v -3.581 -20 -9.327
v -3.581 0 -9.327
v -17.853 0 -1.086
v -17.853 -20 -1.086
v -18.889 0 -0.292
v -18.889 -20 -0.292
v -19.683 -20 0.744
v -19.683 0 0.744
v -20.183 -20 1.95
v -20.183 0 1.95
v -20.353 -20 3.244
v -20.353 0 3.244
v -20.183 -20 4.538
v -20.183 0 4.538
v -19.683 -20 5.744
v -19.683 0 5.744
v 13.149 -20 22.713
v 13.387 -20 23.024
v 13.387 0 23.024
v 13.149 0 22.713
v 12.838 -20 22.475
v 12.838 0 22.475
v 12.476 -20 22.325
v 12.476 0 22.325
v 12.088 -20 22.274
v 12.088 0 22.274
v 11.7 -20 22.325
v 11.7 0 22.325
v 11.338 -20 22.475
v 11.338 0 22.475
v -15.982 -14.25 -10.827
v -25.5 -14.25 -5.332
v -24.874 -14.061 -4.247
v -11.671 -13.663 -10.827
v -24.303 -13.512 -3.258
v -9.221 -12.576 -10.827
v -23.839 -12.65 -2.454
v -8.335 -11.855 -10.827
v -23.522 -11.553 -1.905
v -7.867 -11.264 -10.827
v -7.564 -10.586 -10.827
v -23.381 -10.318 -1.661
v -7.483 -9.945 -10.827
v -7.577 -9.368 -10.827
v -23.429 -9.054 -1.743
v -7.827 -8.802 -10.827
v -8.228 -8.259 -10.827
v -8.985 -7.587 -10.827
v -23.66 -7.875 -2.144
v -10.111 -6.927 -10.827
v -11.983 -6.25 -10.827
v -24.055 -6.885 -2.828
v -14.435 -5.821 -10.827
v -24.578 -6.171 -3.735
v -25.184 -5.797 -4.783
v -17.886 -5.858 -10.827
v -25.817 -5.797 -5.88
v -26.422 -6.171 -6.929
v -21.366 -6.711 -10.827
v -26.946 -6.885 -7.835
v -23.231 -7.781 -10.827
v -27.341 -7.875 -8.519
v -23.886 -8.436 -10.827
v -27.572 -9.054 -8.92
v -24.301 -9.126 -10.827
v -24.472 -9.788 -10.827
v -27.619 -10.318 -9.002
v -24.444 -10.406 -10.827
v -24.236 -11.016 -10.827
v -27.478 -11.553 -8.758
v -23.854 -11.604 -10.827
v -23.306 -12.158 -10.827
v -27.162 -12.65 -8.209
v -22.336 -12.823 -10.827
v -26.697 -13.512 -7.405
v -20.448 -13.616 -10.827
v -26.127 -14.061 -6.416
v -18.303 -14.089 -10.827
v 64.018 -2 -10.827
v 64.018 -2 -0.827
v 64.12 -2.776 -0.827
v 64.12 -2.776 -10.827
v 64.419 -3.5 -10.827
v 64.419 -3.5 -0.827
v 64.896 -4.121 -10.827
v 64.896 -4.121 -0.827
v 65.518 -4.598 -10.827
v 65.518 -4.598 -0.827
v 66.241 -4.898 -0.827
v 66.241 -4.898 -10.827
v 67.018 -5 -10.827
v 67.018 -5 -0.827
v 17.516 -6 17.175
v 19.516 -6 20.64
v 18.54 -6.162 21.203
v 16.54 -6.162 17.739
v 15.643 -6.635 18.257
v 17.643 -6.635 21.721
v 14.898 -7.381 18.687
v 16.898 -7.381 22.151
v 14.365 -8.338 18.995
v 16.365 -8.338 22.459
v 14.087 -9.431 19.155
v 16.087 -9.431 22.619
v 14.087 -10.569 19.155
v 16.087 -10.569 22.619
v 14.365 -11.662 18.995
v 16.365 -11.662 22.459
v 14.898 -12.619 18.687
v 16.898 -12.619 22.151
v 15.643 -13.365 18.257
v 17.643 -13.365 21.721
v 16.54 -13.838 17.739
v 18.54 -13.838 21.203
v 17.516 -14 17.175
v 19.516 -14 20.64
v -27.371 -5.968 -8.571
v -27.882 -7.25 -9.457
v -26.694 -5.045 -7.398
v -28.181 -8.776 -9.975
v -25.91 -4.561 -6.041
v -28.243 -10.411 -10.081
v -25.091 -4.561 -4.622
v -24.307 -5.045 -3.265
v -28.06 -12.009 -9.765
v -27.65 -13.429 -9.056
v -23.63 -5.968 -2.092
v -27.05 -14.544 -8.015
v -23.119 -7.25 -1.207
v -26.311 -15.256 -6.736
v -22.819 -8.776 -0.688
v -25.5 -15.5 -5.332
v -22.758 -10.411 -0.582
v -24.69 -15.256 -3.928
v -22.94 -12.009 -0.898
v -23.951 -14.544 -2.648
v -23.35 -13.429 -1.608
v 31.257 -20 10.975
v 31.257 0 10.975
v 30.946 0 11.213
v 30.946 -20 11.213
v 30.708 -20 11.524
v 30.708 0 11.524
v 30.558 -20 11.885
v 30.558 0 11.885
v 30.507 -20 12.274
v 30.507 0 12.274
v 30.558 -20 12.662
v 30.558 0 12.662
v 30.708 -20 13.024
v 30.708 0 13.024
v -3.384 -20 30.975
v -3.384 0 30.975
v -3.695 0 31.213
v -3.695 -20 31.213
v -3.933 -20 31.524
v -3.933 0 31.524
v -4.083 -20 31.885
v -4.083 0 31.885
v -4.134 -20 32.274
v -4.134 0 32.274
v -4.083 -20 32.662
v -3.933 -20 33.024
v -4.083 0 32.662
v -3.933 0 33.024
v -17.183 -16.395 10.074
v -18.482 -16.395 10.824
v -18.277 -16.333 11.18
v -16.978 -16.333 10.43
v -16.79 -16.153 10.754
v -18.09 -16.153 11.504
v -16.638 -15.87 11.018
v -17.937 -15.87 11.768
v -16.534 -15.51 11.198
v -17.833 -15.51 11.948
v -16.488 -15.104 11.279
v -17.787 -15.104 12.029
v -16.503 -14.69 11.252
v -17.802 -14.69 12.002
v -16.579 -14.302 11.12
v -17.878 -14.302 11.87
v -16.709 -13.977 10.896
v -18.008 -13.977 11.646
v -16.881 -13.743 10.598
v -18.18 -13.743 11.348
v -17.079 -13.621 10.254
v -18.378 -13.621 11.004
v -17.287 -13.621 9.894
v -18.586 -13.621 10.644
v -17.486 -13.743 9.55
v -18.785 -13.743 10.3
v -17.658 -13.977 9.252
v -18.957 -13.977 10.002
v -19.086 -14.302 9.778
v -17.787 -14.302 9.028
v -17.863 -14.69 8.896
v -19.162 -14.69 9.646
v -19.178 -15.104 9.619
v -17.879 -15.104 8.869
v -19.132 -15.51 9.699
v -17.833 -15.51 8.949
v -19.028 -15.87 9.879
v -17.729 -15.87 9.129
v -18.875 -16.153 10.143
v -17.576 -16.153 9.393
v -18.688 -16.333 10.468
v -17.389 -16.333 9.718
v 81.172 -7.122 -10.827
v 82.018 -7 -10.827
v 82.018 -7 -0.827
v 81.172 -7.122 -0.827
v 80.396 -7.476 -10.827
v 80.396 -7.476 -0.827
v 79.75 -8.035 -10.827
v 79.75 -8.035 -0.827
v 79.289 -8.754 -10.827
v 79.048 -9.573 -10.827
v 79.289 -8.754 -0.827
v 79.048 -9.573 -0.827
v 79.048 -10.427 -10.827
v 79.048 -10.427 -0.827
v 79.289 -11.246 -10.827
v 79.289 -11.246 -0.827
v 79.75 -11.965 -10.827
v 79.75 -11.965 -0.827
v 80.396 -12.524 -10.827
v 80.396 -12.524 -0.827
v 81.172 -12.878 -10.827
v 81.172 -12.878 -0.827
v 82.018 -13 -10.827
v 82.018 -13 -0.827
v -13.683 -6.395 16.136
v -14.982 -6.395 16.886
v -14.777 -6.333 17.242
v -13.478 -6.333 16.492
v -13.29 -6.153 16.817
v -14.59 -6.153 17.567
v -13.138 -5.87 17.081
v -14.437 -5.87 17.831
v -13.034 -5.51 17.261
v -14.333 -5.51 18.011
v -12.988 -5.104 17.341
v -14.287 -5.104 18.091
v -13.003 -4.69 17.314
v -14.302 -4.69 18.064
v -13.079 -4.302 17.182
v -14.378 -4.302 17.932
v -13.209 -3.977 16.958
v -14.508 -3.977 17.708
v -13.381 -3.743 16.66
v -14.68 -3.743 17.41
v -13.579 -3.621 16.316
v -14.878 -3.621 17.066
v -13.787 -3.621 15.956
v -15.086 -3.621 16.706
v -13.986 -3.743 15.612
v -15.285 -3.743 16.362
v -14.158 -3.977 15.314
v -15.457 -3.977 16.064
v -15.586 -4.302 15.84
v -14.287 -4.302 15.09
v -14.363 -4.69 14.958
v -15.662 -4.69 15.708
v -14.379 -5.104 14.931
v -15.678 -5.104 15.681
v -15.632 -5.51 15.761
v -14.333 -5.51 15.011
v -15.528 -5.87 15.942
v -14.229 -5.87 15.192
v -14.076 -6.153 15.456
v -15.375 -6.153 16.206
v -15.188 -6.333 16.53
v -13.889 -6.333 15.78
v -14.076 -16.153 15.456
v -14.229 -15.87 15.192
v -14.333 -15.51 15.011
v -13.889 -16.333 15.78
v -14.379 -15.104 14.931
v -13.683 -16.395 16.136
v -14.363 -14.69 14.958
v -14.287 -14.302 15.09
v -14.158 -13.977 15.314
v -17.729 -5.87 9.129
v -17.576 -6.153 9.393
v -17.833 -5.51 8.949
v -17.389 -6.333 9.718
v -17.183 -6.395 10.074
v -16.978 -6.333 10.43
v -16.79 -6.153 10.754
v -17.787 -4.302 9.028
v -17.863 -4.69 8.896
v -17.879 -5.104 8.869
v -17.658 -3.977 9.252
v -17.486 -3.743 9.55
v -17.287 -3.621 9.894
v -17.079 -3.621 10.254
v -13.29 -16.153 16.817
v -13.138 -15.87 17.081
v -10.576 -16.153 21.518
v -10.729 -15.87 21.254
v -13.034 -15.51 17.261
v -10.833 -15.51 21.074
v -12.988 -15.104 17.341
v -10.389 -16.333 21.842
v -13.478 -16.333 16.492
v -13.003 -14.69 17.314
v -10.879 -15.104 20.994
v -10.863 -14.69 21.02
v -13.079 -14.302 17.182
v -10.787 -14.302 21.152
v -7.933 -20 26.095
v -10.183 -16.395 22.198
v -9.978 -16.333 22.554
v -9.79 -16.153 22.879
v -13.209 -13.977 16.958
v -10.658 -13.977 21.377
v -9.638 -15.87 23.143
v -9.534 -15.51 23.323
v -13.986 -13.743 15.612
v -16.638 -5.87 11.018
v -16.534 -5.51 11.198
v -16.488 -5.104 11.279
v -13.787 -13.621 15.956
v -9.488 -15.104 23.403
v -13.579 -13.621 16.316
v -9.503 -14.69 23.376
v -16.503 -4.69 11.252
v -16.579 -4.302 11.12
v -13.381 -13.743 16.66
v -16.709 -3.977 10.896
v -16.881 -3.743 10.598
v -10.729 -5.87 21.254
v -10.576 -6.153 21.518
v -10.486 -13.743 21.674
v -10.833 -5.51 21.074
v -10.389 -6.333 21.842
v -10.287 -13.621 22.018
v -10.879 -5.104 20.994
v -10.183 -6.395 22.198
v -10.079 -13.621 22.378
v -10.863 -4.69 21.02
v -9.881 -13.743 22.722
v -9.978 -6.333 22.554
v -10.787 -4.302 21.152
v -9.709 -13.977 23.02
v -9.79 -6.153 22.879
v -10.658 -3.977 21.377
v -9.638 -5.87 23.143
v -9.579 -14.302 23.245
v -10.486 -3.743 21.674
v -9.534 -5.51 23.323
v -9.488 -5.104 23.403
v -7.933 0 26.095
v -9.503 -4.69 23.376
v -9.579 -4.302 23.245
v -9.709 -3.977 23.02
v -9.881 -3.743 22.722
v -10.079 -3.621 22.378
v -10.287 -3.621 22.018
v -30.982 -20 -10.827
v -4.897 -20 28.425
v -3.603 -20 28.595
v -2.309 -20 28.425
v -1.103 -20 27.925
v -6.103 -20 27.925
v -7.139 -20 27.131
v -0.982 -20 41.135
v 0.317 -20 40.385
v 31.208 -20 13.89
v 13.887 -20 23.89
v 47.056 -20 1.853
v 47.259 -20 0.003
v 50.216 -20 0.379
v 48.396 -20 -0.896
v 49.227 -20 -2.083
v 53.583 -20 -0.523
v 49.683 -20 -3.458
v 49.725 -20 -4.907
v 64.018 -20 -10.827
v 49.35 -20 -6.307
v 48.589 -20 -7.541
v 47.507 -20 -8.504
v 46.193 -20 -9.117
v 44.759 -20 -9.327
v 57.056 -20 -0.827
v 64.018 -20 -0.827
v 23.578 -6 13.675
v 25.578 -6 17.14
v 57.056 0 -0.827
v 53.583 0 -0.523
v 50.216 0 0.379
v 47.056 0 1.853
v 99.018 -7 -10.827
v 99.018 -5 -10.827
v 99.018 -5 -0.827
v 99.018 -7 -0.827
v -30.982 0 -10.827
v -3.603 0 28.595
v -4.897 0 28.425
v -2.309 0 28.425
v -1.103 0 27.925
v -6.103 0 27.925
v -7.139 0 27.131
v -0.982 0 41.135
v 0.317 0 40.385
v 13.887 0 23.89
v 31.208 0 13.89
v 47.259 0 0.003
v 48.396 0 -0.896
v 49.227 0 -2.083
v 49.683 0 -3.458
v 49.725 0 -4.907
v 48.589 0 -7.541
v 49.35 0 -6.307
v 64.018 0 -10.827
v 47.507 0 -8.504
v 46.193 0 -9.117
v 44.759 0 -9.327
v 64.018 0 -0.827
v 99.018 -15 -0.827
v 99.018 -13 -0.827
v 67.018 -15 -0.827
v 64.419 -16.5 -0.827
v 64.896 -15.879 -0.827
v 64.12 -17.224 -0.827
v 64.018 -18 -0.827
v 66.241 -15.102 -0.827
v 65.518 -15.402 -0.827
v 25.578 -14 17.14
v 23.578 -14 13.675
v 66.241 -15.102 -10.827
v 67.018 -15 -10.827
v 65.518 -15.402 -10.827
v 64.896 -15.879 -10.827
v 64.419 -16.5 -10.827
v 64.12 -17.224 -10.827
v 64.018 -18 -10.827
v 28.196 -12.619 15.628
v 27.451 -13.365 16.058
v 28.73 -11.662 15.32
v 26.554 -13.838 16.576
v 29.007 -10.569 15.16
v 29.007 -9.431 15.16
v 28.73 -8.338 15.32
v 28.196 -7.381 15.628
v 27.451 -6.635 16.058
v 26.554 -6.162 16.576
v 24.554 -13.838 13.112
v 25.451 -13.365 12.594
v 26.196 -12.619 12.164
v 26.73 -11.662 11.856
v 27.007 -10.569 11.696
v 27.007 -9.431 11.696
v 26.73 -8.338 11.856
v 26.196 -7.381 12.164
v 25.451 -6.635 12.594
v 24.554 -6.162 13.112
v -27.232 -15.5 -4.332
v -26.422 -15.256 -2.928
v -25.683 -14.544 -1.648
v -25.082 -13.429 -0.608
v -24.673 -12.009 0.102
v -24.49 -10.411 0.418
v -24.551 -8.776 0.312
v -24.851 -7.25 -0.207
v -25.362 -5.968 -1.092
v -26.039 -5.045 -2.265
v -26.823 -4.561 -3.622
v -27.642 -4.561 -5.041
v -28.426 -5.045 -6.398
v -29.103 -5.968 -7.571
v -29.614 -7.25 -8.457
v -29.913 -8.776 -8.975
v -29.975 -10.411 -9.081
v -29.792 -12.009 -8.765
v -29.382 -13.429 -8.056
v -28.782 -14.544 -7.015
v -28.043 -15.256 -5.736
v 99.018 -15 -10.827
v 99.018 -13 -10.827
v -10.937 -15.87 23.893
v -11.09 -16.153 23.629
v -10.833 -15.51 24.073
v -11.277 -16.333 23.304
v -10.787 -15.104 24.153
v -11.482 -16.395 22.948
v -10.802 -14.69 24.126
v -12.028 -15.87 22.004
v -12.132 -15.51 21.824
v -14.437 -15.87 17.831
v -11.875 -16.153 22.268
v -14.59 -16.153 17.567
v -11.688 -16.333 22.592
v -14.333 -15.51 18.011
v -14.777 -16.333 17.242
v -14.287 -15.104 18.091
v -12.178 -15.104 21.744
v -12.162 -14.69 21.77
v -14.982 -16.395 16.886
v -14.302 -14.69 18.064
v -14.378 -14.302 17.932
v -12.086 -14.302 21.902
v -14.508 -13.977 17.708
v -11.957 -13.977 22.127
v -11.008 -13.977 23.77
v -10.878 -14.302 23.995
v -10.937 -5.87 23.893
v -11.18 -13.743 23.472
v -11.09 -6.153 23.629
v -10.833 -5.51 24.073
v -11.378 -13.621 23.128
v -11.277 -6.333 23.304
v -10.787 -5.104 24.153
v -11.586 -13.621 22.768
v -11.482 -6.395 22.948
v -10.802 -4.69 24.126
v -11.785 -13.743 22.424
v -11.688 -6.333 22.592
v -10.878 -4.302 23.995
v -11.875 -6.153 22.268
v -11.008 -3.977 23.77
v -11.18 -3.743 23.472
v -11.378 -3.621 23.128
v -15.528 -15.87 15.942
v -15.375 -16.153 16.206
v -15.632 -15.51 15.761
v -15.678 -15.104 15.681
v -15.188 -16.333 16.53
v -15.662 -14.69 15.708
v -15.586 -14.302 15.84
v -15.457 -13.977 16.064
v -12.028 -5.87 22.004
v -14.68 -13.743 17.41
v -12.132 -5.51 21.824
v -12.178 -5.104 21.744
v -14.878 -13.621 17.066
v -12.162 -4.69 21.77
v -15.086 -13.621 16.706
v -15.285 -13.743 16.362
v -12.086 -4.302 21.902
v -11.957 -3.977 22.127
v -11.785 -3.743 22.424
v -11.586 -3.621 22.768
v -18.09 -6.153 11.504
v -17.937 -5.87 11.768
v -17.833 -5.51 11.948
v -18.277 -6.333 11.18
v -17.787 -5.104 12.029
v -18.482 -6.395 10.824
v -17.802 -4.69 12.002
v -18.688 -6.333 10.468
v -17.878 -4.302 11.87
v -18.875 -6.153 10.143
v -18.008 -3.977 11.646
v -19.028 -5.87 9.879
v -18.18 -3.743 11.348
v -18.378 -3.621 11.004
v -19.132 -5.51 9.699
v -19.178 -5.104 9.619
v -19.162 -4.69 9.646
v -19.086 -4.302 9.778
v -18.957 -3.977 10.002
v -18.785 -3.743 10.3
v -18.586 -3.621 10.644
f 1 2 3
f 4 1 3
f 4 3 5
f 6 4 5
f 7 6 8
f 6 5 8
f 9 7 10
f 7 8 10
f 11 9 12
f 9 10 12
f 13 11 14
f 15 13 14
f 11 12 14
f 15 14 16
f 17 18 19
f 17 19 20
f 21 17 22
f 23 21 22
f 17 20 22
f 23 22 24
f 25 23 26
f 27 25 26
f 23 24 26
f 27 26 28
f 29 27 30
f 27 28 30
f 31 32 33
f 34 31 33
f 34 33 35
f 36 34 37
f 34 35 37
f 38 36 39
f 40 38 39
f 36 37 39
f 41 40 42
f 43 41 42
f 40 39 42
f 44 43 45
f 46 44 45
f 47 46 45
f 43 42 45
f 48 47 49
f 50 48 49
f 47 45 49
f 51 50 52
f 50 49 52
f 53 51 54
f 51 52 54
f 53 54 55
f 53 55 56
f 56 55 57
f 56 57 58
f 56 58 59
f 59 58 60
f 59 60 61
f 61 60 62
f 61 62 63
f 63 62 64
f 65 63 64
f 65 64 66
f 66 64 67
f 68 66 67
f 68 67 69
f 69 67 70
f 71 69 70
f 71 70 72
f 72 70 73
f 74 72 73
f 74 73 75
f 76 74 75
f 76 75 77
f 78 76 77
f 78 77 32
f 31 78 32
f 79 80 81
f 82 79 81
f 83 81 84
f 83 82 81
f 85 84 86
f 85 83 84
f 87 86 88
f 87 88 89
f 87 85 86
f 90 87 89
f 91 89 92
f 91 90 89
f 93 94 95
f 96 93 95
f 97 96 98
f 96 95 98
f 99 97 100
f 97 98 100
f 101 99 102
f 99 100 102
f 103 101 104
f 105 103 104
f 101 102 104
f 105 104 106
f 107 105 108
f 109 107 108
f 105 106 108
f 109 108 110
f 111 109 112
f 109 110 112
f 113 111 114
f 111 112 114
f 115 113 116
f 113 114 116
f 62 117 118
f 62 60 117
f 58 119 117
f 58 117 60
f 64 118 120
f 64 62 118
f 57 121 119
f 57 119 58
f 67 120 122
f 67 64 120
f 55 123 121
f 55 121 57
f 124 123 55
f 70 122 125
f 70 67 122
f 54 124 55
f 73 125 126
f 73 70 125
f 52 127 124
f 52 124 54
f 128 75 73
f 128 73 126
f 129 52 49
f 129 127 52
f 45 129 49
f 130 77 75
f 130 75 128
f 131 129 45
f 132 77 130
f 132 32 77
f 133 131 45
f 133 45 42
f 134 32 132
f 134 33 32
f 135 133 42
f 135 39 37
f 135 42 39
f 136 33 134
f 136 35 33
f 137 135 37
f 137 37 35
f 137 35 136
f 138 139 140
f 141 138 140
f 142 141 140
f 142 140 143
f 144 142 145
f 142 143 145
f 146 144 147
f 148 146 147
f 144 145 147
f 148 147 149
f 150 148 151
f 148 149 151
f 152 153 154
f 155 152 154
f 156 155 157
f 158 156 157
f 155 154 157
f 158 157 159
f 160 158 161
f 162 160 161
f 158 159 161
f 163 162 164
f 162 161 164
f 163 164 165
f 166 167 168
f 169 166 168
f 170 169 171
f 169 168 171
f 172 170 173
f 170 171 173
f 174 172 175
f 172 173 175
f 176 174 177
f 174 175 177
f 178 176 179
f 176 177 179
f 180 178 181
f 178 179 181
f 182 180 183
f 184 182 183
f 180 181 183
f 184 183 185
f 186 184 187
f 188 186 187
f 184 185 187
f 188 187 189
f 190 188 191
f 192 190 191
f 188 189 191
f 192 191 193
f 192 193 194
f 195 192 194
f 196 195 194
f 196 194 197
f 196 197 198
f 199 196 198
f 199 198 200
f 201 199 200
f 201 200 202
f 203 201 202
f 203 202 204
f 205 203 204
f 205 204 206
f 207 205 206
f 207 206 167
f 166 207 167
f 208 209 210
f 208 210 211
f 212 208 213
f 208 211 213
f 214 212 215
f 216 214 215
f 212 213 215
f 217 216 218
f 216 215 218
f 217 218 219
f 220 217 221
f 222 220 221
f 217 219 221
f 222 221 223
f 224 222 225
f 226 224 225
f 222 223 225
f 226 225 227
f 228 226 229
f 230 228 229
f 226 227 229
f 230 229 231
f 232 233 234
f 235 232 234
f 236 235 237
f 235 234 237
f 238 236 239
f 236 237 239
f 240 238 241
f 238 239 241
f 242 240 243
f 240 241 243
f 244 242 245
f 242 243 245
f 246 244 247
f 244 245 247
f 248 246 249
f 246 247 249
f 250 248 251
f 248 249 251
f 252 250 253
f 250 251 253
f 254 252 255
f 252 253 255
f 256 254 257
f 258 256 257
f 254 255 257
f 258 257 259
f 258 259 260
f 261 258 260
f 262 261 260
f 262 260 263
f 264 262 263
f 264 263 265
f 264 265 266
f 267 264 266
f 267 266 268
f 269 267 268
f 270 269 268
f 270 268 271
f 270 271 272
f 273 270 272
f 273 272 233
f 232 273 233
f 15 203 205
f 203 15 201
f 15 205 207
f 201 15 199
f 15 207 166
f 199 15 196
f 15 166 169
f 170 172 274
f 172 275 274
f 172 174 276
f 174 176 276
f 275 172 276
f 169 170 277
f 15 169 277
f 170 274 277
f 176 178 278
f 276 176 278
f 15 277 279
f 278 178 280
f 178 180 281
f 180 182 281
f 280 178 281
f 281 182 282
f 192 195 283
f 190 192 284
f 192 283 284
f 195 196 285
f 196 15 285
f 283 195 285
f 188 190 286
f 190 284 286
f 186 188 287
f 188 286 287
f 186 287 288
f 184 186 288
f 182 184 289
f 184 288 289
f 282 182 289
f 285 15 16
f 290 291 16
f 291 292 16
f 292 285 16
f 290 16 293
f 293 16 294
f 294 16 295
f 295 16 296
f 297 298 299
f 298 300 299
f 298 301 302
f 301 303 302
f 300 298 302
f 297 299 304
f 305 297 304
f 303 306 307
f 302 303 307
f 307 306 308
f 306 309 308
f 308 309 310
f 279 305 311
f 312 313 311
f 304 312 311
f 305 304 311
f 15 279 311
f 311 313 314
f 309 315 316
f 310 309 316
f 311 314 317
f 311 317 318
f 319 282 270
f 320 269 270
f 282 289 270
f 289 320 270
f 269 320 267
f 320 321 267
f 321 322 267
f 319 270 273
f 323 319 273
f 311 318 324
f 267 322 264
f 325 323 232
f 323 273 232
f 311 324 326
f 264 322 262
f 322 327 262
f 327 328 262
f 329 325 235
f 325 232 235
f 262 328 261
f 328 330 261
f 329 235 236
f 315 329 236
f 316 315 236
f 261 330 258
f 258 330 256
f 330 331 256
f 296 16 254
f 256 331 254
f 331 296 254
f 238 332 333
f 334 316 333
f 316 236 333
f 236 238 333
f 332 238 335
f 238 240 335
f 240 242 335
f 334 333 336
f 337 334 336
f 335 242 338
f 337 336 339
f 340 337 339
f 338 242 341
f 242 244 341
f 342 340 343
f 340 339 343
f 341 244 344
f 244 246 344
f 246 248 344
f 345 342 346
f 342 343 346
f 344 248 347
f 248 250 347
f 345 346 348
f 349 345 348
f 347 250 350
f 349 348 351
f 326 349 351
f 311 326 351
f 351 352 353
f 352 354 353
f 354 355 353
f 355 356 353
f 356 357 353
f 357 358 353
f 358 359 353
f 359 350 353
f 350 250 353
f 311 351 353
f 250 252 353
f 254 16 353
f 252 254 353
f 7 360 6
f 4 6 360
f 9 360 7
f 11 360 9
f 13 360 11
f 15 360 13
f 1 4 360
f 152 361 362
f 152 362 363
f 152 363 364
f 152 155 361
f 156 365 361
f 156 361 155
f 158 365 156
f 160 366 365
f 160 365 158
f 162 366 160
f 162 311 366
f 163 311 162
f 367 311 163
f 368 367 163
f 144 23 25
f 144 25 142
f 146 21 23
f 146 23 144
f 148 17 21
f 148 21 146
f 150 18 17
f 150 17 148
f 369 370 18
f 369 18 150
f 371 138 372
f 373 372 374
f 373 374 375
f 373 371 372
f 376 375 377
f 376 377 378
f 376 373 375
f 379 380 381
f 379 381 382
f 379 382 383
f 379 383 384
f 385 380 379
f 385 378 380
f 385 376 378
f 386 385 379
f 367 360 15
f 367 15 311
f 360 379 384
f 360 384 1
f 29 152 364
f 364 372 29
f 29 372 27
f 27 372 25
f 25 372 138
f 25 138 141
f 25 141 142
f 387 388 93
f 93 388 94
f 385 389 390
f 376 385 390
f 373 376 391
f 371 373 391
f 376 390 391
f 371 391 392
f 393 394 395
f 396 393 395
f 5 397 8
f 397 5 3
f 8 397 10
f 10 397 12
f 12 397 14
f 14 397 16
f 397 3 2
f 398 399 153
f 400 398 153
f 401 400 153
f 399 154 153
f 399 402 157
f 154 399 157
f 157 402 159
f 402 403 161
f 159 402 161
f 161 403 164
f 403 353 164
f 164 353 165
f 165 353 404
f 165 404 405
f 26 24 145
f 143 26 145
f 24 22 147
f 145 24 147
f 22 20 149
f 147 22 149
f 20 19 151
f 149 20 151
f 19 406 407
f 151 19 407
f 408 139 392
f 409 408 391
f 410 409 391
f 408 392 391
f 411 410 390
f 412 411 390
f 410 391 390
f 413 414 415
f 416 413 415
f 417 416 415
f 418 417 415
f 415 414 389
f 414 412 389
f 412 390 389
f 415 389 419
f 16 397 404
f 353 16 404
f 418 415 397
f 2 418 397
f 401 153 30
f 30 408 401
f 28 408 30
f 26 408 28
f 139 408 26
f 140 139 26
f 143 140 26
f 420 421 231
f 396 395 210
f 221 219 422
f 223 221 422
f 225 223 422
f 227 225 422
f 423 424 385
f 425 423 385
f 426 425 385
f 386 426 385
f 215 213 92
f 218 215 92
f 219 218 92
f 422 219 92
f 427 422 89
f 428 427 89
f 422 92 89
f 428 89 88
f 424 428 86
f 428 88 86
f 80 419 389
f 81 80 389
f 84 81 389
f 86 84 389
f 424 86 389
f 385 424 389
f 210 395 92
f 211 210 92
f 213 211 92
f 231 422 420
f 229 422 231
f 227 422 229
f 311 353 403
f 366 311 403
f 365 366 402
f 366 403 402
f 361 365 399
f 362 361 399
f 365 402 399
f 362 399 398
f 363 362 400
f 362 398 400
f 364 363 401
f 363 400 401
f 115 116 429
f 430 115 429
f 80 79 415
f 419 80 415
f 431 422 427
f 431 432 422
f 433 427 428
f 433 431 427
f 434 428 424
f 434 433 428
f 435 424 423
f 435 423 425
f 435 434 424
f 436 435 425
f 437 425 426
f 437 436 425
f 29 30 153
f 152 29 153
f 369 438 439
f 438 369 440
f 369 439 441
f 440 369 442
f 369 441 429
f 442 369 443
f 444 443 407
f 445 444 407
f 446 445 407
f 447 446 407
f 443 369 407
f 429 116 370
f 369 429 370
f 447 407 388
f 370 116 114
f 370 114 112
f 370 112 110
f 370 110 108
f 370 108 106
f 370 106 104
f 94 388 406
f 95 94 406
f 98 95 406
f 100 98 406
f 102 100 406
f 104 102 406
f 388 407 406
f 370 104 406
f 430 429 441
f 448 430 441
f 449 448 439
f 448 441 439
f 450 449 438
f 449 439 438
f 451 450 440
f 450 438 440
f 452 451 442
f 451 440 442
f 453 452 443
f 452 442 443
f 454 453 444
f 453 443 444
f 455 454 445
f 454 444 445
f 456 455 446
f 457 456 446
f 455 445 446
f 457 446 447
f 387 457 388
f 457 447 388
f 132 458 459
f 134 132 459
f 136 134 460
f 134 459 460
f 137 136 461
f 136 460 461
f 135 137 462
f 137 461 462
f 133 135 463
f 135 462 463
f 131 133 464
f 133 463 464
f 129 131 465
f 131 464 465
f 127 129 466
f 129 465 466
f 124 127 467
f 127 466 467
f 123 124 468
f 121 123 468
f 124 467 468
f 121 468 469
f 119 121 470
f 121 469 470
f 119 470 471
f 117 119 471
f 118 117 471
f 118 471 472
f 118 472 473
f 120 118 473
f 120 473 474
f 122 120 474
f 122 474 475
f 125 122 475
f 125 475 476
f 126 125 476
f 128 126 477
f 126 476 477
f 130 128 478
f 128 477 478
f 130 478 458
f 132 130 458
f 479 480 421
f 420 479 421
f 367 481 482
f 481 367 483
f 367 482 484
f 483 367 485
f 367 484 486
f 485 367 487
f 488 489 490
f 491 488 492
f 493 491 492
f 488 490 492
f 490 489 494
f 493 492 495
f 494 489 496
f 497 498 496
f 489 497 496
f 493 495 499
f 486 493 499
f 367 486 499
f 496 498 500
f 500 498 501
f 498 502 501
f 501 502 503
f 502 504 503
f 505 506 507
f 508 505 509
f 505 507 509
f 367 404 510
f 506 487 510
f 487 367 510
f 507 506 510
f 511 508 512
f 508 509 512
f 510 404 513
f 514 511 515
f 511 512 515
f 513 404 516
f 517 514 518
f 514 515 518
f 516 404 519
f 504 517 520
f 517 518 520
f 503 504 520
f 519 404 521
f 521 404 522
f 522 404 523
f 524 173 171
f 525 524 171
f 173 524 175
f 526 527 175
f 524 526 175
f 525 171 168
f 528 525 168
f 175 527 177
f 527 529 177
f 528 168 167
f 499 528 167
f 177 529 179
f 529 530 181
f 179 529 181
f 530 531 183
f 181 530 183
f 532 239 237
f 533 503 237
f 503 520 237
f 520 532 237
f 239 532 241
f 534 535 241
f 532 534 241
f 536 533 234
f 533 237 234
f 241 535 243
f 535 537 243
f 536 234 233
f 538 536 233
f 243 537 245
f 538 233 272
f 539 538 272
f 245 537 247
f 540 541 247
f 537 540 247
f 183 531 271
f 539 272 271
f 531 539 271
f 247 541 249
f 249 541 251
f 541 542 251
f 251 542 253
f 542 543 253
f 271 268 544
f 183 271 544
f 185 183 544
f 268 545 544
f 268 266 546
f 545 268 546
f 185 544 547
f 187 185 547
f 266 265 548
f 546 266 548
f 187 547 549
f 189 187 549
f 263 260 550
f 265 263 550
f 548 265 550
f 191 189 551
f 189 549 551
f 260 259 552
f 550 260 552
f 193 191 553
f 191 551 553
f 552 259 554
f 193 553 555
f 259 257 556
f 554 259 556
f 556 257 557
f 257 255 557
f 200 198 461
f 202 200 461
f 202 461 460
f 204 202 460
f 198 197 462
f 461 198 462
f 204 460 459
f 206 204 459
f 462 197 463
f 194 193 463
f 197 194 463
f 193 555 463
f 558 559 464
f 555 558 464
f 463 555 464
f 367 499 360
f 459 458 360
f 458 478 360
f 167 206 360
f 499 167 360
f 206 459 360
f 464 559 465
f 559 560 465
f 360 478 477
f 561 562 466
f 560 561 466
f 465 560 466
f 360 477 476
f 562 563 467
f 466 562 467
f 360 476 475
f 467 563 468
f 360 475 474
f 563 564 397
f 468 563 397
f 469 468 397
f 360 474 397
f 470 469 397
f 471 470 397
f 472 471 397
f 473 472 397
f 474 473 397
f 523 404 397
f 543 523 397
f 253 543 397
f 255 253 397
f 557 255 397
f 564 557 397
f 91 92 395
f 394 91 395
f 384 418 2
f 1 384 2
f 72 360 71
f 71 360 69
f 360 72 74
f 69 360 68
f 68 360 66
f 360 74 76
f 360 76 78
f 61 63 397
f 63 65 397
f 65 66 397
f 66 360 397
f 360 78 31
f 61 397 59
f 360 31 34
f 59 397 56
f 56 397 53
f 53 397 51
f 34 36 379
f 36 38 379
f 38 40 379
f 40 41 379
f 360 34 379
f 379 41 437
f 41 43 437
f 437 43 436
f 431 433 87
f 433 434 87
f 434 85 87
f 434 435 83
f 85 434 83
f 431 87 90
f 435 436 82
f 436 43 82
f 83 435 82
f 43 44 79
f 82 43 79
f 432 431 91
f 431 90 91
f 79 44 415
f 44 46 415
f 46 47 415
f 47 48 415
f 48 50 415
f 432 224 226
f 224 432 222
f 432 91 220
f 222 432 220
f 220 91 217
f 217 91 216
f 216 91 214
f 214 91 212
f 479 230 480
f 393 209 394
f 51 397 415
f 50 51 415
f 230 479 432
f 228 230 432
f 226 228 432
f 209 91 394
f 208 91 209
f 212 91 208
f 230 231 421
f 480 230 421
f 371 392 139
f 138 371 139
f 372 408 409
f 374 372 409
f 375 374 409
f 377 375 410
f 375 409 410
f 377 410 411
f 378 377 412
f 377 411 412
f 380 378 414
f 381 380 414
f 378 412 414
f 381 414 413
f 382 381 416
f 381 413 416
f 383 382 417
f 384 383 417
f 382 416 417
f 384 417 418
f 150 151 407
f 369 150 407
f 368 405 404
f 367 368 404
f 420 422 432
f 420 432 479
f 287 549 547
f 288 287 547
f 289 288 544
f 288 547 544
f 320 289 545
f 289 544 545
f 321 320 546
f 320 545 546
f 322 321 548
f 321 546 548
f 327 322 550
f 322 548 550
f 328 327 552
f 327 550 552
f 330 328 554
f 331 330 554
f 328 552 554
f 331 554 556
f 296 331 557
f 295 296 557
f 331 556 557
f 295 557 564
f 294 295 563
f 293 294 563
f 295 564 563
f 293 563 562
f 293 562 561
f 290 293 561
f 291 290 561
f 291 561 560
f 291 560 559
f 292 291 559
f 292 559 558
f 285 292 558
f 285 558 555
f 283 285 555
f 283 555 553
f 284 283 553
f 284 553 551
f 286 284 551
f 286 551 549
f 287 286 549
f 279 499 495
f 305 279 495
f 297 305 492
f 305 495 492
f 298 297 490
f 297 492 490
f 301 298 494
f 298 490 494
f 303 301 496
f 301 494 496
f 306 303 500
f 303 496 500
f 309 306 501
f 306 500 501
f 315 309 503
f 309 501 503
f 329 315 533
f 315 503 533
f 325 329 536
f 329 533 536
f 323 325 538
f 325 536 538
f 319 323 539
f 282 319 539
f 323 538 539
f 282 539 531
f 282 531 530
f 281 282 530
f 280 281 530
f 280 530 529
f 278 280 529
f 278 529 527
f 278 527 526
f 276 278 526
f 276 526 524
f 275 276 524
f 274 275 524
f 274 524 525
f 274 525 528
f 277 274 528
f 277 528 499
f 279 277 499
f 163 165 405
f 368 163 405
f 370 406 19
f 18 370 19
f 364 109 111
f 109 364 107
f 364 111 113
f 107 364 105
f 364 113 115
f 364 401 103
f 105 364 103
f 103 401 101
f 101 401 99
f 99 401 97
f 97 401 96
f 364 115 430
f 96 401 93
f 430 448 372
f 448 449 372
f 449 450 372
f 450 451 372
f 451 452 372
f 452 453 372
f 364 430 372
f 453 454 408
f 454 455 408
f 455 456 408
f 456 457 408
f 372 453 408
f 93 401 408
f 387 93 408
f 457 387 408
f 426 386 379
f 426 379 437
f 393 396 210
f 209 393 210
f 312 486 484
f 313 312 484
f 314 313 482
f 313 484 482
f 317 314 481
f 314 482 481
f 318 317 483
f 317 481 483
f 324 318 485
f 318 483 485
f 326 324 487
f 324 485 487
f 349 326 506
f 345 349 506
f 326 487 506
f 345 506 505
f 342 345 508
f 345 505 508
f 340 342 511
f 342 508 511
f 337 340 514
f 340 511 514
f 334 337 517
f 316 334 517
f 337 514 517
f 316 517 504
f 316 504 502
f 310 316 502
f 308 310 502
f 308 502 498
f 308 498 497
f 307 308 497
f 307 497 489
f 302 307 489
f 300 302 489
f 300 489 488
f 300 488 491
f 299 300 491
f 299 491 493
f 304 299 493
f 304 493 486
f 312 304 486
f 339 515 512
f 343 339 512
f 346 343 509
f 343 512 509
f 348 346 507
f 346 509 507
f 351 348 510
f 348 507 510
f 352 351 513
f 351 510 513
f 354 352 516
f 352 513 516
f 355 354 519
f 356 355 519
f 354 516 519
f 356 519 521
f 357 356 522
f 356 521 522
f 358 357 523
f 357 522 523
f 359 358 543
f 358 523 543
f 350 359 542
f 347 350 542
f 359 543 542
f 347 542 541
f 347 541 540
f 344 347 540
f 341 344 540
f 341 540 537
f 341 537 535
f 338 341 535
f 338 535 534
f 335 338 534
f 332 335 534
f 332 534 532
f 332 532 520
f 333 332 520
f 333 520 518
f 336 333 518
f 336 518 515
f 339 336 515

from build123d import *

# Parameters (mm, degrees)
F0_W      = 35
F0_H      = 10
F1_DEPTH  = 20
F3_DEPTH  = 25
F4_W      = 35
F4_H      = 5
F6_DEPTH  = 10.001
F7_DEPTH  = 10.001
F8_DEPTH  = 10.001
F9_R      = 3
F5_R      = 1.395
F10_DEPTH = 25
F5_R_2    = 4.25
F11_DEPTH = 112.584302492
F5_R_3    = 5.5
F12_DEPTH = 2


with BuildPart() as f1:
    # F0 (on Front) → F1 (new body)
    with BuildSketch(Plane.XZ):
        with BuildLine():
            Line((-0.9824314987, 41.1347855624), (-30.9824314987, -10.8267386647))
            Line((-30.9824314987, -10.8267386647), (64.0175685013, -10.8267386647))
            Line((64.0175685013, -10.8267386647), (64.0175685013, -0.8267386647))
            Line((64.0175685013, -0.8267386647), (57.0560442742, -0.8267386647))
            ThreePointArc((57.0560442742, -0.8267386647), (51.8796633722, -0.1452551905), (47.0560442742, 1.8527532596))
            Line((47.0560442742, 1.8527532596), (31.256660864, 10.9745315245))
            ThreePointArc((31.256660864, 10.9745315245), (30.5577721246, 11.8853410626), (30.7076227583, 13.0235696302))
            Line((30.7076227583, 13.0235696302), (31.2076227583, 13.889595034))
            Line((31.2076227583, 13.889595034), (13.8871146826, 23.889595034))
            Line((13.8871146826, 23.889595034), (13.3871146826, 23.0235696302))
            ThreePointArc((13.3871146826, 23.0235696302), (12.4763051446, 22.3246808908), (11.338076577, 22.4745315245))
            Line((11.338076577, 22.4745315245), (-3.3843552874, 30.9745315245))
            ThreePointArc((-3.3843552874, 30.9745315245), (-4.0832440268, 31.8853410626), (-3.933393393, 33.0235696302))
            Line((-3.933393393, 33.0235696302), (0.316606607, 40.3847855624))
            Line((0.316606607, 40.3847855624), (-0.9824314987, 41.1347855624))
        make_face()
        with BuildLine():
            ThreePointArc((-17.8532663741, -1.0863576079), (-20.1828955056, 1.9496741855), (-19.683393393, 5.743769411))
            Line((-19.683393393, 5.743769411), (-7.933393393, 26.0953663999))
            ThreePointArc((-7.933393393, 26.0953663999), (-4.8973615996, 28.4249955314), (-1.1032663741, 27.9254934189))
            Line((-1.1032663741, 27.9254934189), (47.2592382521, 0.0033883542))
            ThreePointArc((47.2592382521, 0.0033883542), (49.5888673835, -5.6208338902), (44.7592382521, -9.3267386647))
            Line((44.7592382521, -9.3267386647), (-3.5805077101, -9.3267386647))
            Line((-3.5805077101, -9.3267386647), (-17.8532663741, -1.0863576079))
        make_face(mode=Mode.SUBTRACT)
        with Locations((81.5175685013, -5.8267386647)):
            Rectangle(F0_W, F0_H)
    extrude(amount=F1_DEPTH)

    # F2 (on face) → F3 (cut)
    with BuildSketch(Plane(origin=(13.8162767634, 0, 23.9304933257), x_dir=(0.8660254038, 0, -0.5), z_dir=(0.5, 0, 0.8660254038))):
        with BuildLine():
            Line((13.5817965834, -6), (6.5817965834, -6))
            ThreePointArc((6.5817965834, -6), (2.5817965834, -10), (6.5817965834, -14))
            Line((6.5817965834, -14), (13.5817965834, -14))
            ThreePointArc((13.5817965834, -14), (17.5817965834, -10), (13.5817965834, -6))
        make_face()
    extrude(amount=-F3_DEPTH, mode=Mode.SUBTRACT)

    # F4 (on face) → F6 (cut, through all)
    with BuildSketch(Plane.XY.offset(-0.8267386647)):
        with Locations((81.5175685013, -2.5)):
            Rectangle(F4_W, F4_H)
    extrude(amount=-F6_DEPTH, mode=Mode.SUBTRACT)

    # F4 (on face) → F7 (cut, through all)
    with BuildSketch(Plane.XY.offset(-0.8267386647)):
        with Locations((81.5175685013, -17.5)):
            Rectangle(F4_W, F4_H)
    extrude(amount=-F7_DEPTH, mode=Mode.SUBTRACT)

    # F4 (on face) → F8 (cut, through all)
    with BuildSketch(Plane.XY.offset(-0.8267386647)):
        with BuildLine():
            Line((99.0175685013, -13), (99.0175685013, -7))
            Line((99.0175685013, -7), (82.0175685013, -7))
            ThreePointArc((82.0175685013, -7), (79.0175685013, -10), (82.0175685013, -13))
            Line((82.0175685013, -13), (99.0175685013, -13))
        make_face()
    extrude(amount=-F8_DEPTH, mode=Mode.SUBTRACT)

    # F9
    f9_edges = [f1.edges().sort_by_distance(p)[0] for p in [
        (64.017569, -5, -5.826739),
        (64.017569, -15, -5.826739),
    ]]
    fillet(f9_edges, radius=F9_R)

    # F5 (on face) → F10 (cut)
    with BuildSketch(Plane(origin=(-18.5487082622, 0, 10.7091017083), x_dir=(0, -1, 0), z_dir=(-0.8660254038, 0, 0.5))):
        with Locations((15, 7.1325535269)):
            Circle(F5_R)
        with Locations((15, 14.1325535269)):
            Circle(F5_R)
        with Locations((5, 14.1325535269)):
            Circle(F5_R)
        with Locations((5, 7.1325535269)):
            Circle(F5_R)
        with Locations((5, 0.1325535269)):
            Circle(F5_R)
        with Locations((15, 0.1325535269)):
            Circle(F5_R)
    extrude(amount=-F10_DEPTH, mode=Mode.SUBTRACT)

    # F5 (on face) → F11 (cut, through all)
    with BuildSketch(Plane(origin=(-18.5487082622, 0, 10.7091017083), x_dir=(0, -1, 0), z_dir=(-0.8660254038, 0, 0.5))):
        with Locations((10, -17.3674464731)):
            Circle(F5_R_2)
    extrude(amount=-F11_DEPTH, mode=Mode.SUBTRACT)

    # F5 (on face) → F12 (cut)
    with BuildSketch(Plane(origin=(-18.5487082622, 0, 10.7091017083), x_dir=(0, -1, 0), z_dir=(-0.8660254038, 0, 0.5))):
        with Locations((10, -17.3674464731)):
            Circle(F5_R_3)
        with Locations((10, -17.3674464731)):
            Circle(F5_R_2, mode=Mode.SUBTRACT)
    extrude(amount=-F12_DEPTH, mode=Mode.SUBTRACT)


solid = f1.part
